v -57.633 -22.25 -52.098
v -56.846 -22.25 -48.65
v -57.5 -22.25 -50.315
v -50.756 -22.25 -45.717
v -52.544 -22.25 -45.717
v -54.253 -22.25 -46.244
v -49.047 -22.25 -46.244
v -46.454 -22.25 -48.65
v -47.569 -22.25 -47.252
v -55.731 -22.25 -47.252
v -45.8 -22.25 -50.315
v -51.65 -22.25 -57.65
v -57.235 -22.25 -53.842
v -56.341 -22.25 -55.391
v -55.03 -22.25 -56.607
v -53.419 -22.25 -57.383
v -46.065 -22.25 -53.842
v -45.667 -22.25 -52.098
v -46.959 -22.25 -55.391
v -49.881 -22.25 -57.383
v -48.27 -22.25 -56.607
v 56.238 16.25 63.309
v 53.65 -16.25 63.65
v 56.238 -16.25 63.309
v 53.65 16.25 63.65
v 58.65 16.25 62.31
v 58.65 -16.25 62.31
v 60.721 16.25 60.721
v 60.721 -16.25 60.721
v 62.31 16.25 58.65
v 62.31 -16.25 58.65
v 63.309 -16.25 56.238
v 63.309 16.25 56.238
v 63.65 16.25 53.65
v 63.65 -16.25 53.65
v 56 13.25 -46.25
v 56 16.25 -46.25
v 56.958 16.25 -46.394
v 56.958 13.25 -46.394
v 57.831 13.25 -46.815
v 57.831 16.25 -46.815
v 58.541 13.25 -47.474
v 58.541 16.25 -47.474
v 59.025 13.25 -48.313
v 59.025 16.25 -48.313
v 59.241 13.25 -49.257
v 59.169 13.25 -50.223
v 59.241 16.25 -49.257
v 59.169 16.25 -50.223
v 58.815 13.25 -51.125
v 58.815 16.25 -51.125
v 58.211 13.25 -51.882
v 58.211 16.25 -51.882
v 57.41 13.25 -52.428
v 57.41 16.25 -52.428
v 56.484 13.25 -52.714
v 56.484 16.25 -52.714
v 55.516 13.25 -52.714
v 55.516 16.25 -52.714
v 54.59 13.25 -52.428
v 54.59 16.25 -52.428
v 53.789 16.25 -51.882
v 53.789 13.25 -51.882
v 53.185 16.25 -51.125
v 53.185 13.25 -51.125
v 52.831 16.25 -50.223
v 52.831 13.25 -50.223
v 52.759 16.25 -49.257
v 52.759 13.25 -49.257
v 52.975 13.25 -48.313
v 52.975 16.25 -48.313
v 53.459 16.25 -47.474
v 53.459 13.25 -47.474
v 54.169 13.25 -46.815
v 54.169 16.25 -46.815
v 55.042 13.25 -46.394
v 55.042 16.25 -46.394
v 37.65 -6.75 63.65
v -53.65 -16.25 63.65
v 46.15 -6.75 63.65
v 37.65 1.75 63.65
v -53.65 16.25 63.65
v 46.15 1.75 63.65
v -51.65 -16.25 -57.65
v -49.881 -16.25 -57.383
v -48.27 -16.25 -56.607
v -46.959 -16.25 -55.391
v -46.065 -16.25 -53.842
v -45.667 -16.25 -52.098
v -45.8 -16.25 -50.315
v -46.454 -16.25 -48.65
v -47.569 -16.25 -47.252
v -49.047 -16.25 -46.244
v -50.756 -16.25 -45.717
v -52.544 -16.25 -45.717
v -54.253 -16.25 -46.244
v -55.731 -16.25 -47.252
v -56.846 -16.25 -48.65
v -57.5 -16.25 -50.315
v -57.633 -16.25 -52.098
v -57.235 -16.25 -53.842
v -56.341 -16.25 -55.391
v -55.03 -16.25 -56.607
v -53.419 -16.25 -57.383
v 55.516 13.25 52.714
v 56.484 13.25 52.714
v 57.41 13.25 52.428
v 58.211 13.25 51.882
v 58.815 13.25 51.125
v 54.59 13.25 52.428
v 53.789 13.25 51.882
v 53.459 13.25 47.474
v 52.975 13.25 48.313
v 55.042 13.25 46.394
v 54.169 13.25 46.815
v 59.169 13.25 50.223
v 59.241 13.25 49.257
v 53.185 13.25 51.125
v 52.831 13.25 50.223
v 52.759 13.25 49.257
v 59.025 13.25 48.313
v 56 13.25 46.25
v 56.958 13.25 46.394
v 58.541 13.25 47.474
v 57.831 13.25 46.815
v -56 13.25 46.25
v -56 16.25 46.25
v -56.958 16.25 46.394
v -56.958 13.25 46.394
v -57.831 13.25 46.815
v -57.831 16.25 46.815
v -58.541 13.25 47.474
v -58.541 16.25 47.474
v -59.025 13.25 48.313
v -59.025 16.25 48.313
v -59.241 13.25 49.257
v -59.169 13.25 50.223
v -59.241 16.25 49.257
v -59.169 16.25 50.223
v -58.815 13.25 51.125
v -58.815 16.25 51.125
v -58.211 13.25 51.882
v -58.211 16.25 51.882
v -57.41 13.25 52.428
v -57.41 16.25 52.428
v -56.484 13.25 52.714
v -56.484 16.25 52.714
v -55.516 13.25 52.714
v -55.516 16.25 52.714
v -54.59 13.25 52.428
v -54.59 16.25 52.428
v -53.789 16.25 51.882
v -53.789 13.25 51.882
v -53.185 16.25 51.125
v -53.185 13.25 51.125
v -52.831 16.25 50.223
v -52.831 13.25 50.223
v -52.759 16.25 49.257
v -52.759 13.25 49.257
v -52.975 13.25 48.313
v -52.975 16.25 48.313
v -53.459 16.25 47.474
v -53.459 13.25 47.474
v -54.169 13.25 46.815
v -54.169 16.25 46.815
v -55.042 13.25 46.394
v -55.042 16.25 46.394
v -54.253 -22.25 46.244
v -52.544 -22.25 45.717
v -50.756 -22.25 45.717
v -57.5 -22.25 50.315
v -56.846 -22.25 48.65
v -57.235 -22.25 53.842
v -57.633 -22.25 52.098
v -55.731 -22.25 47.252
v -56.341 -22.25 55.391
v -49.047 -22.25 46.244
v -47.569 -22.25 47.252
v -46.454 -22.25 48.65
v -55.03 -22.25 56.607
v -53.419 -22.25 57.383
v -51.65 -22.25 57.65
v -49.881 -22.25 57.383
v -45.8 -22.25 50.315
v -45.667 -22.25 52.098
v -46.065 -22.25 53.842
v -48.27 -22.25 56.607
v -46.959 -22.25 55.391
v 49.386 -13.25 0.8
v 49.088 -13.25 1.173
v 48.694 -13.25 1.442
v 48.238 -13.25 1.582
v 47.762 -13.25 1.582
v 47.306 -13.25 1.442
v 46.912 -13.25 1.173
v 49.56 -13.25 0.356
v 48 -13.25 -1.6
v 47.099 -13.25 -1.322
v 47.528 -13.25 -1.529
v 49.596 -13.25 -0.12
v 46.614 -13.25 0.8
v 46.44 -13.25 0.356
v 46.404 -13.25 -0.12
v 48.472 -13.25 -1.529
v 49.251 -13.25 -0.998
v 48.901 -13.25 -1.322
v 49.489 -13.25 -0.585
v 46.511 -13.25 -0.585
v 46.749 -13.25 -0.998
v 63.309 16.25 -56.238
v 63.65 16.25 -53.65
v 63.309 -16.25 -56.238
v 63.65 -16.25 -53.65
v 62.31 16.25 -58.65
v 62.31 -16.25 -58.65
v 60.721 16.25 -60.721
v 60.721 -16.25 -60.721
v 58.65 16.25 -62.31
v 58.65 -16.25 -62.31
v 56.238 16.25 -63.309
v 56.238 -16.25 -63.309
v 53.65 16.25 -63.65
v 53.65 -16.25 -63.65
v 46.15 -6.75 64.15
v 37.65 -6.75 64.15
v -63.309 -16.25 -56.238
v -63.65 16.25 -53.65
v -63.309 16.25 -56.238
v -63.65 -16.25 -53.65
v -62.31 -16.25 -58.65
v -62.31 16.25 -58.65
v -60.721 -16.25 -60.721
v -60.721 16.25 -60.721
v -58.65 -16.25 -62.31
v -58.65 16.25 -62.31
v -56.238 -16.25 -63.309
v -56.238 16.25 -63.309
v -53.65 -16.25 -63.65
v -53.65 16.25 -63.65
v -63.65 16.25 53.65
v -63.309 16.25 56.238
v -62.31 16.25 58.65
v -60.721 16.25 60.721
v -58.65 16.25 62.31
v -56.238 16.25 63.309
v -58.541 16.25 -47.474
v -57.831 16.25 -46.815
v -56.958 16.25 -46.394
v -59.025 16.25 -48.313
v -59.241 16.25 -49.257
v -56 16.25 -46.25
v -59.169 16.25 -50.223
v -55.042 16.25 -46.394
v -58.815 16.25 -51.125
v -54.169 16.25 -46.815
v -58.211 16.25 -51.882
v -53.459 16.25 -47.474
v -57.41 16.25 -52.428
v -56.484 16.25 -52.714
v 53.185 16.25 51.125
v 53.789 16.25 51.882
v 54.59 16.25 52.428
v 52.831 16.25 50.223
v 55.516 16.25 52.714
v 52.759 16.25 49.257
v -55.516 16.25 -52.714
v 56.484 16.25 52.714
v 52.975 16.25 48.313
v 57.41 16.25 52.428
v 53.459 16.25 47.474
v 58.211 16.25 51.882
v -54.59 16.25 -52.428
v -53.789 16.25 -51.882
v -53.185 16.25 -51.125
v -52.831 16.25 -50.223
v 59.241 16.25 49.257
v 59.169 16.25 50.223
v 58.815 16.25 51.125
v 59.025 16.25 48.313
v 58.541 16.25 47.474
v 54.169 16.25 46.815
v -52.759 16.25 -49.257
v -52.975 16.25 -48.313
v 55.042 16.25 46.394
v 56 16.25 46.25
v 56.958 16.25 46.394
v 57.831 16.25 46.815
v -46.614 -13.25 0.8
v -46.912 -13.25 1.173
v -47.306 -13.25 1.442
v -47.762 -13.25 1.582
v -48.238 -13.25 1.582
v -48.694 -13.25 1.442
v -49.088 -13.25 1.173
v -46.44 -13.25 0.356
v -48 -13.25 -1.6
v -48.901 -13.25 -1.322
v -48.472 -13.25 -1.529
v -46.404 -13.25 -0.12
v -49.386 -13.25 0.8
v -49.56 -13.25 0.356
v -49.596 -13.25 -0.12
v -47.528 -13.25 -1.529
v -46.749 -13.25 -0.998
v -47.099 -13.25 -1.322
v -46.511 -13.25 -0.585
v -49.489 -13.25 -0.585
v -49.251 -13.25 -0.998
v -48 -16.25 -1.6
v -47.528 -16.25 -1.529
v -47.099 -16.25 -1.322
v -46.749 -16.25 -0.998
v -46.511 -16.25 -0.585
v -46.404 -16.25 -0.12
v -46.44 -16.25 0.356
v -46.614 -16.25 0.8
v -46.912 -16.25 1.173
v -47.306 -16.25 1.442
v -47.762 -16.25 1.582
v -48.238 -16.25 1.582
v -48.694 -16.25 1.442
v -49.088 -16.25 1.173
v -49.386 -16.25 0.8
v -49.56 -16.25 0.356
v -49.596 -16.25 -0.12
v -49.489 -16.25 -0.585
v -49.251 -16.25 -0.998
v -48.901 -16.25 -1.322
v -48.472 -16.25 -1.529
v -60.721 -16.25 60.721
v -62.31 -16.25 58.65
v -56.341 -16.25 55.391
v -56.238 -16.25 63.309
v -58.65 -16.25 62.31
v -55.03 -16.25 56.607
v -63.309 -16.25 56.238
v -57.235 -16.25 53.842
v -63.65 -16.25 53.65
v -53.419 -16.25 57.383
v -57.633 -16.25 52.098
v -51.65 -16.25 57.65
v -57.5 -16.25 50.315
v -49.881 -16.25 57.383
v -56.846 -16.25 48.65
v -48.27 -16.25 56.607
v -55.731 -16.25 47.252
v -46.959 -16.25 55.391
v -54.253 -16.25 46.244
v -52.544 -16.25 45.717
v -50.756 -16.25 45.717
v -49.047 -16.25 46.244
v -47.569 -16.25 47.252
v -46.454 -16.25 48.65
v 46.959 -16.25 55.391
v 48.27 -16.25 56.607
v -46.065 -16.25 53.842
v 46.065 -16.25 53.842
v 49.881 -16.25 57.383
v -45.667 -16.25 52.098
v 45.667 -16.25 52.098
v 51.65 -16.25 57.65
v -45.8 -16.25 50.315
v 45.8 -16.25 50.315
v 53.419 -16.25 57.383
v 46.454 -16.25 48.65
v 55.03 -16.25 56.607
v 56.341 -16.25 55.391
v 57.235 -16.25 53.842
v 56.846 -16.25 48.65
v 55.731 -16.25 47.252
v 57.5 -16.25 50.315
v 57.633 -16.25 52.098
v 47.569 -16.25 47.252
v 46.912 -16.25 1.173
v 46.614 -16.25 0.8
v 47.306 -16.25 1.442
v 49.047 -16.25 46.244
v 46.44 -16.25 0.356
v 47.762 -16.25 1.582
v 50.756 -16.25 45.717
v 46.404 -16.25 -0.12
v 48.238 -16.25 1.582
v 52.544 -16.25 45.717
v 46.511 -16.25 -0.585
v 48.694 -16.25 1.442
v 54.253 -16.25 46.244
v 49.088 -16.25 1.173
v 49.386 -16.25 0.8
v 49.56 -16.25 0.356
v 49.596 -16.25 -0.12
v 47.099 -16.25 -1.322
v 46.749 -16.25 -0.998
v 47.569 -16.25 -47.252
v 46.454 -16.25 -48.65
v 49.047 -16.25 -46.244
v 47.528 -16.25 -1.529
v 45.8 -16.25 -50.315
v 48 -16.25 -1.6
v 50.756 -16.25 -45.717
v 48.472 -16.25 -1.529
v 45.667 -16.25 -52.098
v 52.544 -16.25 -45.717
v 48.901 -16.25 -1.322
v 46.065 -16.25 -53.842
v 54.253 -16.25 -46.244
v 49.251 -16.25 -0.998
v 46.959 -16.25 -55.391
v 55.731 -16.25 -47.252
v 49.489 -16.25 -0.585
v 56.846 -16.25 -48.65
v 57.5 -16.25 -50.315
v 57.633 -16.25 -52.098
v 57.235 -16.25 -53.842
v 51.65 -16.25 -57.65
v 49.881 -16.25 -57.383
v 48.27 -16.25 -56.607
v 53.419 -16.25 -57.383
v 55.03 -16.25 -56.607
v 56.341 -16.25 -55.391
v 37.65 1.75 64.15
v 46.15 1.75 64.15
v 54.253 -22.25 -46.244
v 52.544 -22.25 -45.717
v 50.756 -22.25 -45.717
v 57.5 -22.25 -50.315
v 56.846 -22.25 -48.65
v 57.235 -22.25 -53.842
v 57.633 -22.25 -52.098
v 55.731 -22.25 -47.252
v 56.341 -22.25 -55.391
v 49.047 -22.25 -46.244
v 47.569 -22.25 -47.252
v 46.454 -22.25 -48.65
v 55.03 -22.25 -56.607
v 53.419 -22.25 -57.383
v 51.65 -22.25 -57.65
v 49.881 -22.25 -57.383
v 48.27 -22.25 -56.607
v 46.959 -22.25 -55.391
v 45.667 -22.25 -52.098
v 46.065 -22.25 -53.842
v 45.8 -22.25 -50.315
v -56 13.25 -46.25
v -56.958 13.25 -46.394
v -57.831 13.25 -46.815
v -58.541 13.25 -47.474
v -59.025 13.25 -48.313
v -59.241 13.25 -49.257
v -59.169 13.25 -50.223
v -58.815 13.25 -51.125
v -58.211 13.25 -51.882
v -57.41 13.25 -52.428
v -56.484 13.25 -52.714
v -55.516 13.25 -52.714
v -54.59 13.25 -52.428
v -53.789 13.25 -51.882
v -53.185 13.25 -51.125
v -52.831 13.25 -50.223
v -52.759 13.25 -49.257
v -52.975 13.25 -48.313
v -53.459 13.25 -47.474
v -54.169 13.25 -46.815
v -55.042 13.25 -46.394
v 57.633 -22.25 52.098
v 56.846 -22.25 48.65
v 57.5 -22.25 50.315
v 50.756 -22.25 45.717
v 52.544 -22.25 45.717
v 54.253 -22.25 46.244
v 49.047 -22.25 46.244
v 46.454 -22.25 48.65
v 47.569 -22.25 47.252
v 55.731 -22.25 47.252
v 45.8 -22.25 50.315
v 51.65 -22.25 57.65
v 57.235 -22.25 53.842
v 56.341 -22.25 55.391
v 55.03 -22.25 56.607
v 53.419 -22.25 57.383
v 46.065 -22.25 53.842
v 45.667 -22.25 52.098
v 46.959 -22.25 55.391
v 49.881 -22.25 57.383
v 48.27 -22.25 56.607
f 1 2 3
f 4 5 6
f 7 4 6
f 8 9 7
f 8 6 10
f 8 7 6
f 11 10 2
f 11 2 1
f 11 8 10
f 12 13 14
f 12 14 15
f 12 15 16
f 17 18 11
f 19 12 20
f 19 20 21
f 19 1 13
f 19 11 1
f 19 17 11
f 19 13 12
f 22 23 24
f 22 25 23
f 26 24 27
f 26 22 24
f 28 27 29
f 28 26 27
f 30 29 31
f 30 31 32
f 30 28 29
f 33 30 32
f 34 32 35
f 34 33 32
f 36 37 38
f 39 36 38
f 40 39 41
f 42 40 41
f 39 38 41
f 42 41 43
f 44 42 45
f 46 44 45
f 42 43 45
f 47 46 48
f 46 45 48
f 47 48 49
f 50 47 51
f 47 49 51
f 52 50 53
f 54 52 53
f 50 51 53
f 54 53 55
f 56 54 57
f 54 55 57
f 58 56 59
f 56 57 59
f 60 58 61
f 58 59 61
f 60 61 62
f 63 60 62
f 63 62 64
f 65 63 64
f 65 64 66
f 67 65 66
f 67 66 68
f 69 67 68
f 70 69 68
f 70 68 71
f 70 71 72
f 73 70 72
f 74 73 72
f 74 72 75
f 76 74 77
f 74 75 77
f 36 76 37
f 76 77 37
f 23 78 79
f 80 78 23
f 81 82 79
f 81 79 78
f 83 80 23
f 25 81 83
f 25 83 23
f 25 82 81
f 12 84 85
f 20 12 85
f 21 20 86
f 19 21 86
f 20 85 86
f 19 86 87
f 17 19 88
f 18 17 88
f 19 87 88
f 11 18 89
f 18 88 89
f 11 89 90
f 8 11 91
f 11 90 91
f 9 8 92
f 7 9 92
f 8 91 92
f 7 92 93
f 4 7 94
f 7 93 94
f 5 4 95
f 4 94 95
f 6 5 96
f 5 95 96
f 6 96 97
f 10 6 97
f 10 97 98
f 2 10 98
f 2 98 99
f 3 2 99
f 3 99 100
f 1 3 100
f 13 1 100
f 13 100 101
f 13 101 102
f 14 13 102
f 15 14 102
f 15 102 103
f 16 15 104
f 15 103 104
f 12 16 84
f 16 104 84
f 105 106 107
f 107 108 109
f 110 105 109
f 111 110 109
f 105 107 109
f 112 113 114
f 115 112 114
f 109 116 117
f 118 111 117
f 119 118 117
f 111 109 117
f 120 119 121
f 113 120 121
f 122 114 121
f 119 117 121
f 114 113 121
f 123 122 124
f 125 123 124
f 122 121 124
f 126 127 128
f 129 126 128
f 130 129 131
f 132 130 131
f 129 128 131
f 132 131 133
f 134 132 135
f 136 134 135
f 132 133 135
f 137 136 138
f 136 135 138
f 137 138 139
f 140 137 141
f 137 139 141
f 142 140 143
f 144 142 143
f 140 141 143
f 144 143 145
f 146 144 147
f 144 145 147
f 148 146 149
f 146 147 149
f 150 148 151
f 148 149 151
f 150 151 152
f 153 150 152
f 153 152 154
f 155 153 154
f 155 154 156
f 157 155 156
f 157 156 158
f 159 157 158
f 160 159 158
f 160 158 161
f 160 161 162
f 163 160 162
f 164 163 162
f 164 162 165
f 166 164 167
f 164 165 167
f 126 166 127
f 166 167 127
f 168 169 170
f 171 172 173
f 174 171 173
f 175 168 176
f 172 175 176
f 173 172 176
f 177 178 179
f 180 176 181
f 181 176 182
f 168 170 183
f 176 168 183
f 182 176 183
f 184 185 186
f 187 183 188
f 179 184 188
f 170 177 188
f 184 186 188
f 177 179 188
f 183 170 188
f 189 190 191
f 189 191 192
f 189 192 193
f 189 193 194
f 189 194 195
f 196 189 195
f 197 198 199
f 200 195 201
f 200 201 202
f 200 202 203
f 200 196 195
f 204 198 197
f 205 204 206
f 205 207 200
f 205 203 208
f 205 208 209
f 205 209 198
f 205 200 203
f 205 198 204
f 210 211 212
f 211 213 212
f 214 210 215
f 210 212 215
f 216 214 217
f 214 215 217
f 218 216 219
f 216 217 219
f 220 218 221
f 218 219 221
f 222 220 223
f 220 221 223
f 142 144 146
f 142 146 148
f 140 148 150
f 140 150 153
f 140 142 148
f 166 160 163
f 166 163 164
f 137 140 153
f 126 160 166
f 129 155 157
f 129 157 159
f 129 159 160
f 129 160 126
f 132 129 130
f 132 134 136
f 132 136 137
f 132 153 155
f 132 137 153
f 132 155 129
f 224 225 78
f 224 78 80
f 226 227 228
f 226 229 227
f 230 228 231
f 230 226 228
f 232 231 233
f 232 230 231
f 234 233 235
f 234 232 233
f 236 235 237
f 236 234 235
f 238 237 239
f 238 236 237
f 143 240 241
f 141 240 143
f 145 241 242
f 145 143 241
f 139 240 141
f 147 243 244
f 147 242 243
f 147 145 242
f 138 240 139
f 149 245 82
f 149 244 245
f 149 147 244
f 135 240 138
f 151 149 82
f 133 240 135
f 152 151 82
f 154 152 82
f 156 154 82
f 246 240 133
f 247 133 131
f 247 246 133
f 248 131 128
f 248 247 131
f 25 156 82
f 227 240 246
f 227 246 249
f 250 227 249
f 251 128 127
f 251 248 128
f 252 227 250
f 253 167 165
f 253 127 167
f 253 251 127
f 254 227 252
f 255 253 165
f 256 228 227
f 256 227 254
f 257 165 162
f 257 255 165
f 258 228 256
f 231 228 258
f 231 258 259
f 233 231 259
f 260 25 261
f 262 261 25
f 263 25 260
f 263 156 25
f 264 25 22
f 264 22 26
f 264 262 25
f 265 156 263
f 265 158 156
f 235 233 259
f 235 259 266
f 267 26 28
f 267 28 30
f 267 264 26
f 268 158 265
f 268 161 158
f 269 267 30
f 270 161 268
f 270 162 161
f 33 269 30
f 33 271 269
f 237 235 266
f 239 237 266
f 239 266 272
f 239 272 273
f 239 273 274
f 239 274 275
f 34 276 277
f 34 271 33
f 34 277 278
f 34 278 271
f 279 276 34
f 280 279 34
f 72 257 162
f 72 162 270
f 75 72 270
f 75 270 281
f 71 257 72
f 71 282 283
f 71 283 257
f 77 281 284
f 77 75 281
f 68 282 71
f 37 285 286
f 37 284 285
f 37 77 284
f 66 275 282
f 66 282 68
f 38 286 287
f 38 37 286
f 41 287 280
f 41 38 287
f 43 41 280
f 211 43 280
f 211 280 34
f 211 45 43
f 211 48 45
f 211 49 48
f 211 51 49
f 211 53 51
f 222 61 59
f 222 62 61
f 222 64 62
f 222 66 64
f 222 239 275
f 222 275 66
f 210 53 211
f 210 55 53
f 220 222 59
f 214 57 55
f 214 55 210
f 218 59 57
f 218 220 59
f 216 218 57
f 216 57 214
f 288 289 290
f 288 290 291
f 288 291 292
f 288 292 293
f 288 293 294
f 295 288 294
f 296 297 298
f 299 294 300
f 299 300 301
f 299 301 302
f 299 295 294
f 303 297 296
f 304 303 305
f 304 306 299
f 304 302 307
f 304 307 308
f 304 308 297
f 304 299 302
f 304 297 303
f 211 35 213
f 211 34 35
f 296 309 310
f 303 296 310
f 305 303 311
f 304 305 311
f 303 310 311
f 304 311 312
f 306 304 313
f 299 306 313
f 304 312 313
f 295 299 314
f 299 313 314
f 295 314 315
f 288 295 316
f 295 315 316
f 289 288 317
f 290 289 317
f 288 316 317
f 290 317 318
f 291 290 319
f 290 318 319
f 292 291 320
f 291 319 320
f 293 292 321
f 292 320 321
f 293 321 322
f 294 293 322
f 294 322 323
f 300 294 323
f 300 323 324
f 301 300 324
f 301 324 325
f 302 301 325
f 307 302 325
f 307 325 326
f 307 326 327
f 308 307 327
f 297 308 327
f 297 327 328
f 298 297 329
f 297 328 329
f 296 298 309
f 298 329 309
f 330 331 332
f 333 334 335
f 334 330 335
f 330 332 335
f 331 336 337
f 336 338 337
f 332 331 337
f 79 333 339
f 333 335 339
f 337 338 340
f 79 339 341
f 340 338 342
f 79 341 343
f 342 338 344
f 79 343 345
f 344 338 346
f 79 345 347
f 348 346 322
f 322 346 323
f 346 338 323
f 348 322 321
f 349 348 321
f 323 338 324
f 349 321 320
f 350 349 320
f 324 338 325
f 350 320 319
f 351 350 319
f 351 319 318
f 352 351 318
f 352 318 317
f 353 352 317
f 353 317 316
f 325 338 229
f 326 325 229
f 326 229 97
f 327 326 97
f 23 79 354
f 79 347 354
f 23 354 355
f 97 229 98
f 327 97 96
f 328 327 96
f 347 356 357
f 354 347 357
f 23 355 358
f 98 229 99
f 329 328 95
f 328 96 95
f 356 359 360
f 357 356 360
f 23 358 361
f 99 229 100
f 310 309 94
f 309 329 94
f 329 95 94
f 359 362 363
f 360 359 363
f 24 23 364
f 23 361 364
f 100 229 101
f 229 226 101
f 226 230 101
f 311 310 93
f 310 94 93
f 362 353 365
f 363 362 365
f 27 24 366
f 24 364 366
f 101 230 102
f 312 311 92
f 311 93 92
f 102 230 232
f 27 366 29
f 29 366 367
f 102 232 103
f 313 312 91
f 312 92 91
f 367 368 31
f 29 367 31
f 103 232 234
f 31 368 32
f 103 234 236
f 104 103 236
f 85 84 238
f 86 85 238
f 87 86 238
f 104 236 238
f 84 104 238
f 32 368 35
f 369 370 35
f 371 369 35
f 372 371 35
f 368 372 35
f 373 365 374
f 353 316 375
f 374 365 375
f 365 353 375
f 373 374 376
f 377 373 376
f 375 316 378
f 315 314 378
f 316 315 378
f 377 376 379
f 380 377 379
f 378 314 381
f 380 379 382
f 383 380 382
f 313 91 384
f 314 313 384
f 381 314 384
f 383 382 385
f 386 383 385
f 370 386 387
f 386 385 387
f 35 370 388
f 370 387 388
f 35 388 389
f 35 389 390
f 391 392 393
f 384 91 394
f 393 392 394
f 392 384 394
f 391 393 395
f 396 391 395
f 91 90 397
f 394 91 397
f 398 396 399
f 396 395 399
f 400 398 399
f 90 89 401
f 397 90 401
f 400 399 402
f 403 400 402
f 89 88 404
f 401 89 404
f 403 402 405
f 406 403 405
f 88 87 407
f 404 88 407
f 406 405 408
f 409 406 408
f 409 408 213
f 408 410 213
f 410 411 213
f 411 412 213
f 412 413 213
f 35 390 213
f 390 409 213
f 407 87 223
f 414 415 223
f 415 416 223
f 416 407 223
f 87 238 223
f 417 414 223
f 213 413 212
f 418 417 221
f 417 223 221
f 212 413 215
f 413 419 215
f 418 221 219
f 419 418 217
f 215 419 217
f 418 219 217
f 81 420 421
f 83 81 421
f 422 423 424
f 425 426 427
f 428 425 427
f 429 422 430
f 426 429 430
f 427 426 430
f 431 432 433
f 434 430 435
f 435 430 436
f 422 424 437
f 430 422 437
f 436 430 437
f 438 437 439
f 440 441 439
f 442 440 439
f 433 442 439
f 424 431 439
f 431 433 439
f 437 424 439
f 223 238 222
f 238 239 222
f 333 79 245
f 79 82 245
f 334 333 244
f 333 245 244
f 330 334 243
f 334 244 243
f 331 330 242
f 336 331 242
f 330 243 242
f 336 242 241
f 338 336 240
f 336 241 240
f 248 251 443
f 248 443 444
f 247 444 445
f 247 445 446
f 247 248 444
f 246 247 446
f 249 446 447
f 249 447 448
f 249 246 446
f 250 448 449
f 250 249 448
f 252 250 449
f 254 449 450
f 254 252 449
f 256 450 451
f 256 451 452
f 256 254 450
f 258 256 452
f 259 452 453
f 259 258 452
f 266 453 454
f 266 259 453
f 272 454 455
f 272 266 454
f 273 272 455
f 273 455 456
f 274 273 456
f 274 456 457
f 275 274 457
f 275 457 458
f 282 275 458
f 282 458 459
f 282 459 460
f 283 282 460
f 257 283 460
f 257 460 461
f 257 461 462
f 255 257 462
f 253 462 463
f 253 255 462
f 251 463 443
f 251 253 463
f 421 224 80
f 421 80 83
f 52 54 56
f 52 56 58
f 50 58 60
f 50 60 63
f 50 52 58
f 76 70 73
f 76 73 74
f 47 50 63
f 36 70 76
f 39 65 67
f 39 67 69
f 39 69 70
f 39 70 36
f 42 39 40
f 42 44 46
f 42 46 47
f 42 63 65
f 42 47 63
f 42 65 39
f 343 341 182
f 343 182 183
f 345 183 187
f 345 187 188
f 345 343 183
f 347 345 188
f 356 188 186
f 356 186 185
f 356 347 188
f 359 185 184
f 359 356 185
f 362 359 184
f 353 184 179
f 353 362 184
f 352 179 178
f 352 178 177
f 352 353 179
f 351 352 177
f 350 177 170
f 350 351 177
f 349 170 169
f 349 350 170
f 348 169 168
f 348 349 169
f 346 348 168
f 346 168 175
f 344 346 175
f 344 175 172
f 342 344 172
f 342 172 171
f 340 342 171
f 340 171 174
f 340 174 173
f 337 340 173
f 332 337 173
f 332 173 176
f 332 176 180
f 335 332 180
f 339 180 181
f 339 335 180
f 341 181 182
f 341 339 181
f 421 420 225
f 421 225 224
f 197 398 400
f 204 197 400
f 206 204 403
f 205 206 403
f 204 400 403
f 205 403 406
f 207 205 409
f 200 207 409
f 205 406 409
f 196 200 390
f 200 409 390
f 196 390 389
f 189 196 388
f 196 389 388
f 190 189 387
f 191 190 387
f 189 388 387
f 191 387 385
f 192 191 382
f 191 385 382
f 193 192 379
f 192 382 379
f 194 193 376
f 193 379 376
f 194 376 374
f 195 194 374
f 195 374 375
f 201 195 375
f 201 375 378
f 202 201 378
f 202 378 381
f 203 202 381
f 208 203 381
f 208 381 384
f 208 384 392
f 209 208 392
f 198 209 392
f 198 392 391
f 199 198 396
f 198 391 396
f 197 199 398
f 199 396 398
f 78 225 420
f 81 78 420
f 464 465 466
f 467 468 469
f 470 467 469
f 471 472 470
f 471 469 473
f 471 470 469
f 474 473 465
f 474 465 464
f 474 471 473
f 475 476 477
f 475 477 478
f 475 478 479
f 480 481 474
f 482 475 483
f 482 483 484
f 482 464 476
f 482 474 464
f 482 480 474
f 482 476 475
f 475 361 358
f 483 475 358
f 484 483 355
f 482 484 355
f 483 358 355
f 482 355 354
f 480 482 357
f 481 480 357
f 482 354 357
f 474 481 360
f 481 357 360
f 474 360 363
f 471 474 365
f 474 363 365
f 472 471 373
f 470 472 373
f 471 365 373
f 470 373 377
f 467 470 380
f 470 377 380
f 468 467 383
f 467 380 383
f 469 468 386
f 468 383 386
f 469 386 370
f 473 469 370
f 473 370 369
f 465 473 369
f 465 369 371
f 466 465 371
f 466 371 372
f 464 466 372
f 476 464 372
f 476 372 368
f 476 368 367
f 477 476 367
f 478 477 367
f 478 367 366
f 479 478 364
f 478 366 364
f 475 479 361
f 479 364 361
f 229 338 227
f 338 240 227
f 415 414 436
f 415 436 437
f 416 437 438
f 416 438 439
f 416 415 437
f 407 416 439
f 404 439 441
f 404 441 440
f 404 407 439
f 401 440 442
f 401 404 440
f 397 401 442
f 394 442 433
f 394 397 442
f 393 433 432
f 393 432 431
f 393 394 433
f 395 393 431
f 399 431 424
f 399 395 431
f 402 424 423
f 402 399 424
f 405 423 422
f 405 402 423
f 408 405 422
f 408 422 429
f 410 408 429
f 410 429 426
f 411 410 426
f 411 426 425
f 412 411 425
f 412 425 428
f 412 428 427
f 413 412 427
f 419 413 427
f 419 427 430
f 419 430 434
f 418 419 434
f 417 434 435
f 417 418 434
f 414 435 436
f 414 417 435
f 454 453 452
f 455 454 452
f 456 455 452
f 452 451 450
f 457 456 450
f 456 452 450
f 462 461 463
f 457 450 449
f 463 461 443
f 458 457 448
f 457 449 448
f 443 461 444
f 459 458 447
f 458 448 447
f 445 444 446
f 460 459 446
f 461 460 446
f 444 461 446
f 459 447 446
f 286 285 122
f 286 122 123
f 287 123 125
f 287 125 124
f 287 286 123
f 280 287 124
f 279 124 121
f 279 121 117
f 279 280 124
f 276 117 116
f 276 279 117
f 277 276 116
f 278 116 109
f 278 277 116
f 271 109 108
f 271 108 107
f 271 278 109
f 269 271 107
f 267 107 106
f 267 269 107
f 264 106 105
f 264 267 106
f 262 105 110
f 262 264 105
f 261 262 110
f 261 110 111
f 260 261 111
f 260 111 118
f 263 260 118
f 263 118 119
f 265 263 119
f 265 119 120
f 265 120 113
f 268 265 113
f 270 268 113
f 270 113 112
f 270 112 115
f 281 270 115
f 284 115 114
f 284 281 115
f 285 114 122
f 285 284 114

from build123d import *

# Parameters (mm, degrees)
SKETCH_1_W               = 127.3
SKETCH_1_H               = 127.3
EXTRUDE_1_DEPTH          = 16.25
SKETCH_2_W               = 8.5
SKETCH_2_H               = 8.5
EXTRUDE_2_DEPTH          = 0.5
SKETCH_3_R               = 6
EXTRUDE_3_DEPTH          = 6
MIRROR_2_COPY_1_SKETCH_R = 6
MIRROR_2_COPY_1_DEPTH    = 6
SKETCH_4_R               = 3.25
CUT_EXTRUDE_1_DEPTH      = 3
MIRROR_4_COPY_1_SKETCH_R = 3.25
MIRROR_4_COPY_1_DEPTH    = 3
FILLET_1_R               = 10
SKETCH_5_R               = 1.6
CUT_EXTRUDE_2_DEPTH      = 3


with BuildPart() as part:
    # 草图1 → 凸台-拉伸1 (new, symmetric)
    with BuildSketch(Plane(origin=(0, 0, 0), x_dir=(1, 0, 0), z_dir=(0, 1, 0))):
        Rectangle(SKETCH_1_W, SKETCH_1_H)
    extrude(amount=EXTRUDE_1_DEPTH, both=True)

    # 草图2 → 凸台-拉伸2 (add, symmetric)
    with BuildSketch(Plane.XY.offset(63.65)):
        with Locations((41.9, -2.5)):
            Rectangle(SKETCH_2_W, SKETCH_2_H)
    extrude(amount=EXTRUDE_2_DEPTH, both=True)

    # 草图3 → 凸台-拉伸3 (add)
    with BuildSketch(Plane.XZ.offset(16.25)):
        with Locations(Location((51.65, 51.65, 0), (0, 0, 90))):
            Circle(SKETCH_3_R)
    extrude_3 = extrude(amount=EXTRUDE_3_DEPTH)

    # 镜向1: 凸台-拉伸3 across plane
    add(extrude_3.mirror(Plane.XY))

    # 镜向2: 凸台-拉伸3 across plane
    add(extrude_3.mirror(Plane(origin=(0, 0, 0), x_dir=(0, 0, 1), z_dir=(1, 0, 0))))

    # 镜向2 copy 1 sketch → 镜向2 copy 1 (add)
    with BuildSketch(Plane(origin=(0, -16.25, 0), x_dir=(-1, 0, 0), z_dir=(0, -1, 0))):
        with Locations(Location((51.65, 51.65, 0), (0, 0, 90))):
            Circle(MIRROR_2_COPY_1_SKETCH_R)
    extrude(amount=MIRROR_2_COPY_1_DEPTH)

    # 草图4 → 切除-拉伸1 (cut)
    with BuildSketch(Plane(origin=(0, 16.25, 0), x_dir=(1, 0, 0), z_dir=(0, 1, 0))):
        with Locations(Location((56, 49.5, 0), (0, 0, 270))):
            Circle(SKETCH_4_R)
    cut_extrude_1 = extrude(amount=-CUT_EXTRUDE_1_DEPTH, mode=Mode.SUBTRACT)

    # 镜向3: 切除-拉伸1 across plane
    add(cut_extrude_1.mirror(Plane(origin=(0, 0, 0), x_dir=(0, 0, 1), z_dir=(1, 0, 0))), mode=Mode.SUBTRACT)

    # 镜向4: 切除-拉伸1 across plane
    add(cut_extrude_1.mirror(Plane.XY), mode=Mode.SUBTRACT)

    # 镜向4 copy 1 sketch → 镜向4 copy 1 (cut)
    with BuildSketch(Plane(origin=(0, 16.25, 0), x_dir=(-1, 0, 0), z_dir=(0, 1, 0))):
        with Locations(Location((56, 49.5, 0), (0, 0, 270))):
            Circle(MIRROR_4_COPY_1_SKETCH_R)
    extrude(amount=-MIRROR_4_COPY_1_DEPTH, mode=Mode.SUBTRACT)

    # 圆角1
    fillet_1_edges = [part.edges().sort_by_distance(p)[0] for p in [
        (63.65, 0, 63.65),
        (-63.65, 0, 63.65),
        (-63.65, 0, -63.65),
        (63.65, 0, -63.65),
    ]]
    fillet(fillet_1_edges, radius=FILLET_1_R)

    # 草图5 → 切除-拉伸2 (cut)
    with BuildSketch(Plane.XZ.offset(16.25)):
        with Locations(Location((-48, 0, 0), (0, 0, 270))):
            Circle(SKETCH_5_R)
        with Locations(Location((48, 0, 0), (0, 0, 270))):
            Circle(SKETCH_5_R)
    extrude(amount=-CUT_EXTRUDE_2_DEPTH, mode=Mode.SUBTRACT)


solid = part.part
